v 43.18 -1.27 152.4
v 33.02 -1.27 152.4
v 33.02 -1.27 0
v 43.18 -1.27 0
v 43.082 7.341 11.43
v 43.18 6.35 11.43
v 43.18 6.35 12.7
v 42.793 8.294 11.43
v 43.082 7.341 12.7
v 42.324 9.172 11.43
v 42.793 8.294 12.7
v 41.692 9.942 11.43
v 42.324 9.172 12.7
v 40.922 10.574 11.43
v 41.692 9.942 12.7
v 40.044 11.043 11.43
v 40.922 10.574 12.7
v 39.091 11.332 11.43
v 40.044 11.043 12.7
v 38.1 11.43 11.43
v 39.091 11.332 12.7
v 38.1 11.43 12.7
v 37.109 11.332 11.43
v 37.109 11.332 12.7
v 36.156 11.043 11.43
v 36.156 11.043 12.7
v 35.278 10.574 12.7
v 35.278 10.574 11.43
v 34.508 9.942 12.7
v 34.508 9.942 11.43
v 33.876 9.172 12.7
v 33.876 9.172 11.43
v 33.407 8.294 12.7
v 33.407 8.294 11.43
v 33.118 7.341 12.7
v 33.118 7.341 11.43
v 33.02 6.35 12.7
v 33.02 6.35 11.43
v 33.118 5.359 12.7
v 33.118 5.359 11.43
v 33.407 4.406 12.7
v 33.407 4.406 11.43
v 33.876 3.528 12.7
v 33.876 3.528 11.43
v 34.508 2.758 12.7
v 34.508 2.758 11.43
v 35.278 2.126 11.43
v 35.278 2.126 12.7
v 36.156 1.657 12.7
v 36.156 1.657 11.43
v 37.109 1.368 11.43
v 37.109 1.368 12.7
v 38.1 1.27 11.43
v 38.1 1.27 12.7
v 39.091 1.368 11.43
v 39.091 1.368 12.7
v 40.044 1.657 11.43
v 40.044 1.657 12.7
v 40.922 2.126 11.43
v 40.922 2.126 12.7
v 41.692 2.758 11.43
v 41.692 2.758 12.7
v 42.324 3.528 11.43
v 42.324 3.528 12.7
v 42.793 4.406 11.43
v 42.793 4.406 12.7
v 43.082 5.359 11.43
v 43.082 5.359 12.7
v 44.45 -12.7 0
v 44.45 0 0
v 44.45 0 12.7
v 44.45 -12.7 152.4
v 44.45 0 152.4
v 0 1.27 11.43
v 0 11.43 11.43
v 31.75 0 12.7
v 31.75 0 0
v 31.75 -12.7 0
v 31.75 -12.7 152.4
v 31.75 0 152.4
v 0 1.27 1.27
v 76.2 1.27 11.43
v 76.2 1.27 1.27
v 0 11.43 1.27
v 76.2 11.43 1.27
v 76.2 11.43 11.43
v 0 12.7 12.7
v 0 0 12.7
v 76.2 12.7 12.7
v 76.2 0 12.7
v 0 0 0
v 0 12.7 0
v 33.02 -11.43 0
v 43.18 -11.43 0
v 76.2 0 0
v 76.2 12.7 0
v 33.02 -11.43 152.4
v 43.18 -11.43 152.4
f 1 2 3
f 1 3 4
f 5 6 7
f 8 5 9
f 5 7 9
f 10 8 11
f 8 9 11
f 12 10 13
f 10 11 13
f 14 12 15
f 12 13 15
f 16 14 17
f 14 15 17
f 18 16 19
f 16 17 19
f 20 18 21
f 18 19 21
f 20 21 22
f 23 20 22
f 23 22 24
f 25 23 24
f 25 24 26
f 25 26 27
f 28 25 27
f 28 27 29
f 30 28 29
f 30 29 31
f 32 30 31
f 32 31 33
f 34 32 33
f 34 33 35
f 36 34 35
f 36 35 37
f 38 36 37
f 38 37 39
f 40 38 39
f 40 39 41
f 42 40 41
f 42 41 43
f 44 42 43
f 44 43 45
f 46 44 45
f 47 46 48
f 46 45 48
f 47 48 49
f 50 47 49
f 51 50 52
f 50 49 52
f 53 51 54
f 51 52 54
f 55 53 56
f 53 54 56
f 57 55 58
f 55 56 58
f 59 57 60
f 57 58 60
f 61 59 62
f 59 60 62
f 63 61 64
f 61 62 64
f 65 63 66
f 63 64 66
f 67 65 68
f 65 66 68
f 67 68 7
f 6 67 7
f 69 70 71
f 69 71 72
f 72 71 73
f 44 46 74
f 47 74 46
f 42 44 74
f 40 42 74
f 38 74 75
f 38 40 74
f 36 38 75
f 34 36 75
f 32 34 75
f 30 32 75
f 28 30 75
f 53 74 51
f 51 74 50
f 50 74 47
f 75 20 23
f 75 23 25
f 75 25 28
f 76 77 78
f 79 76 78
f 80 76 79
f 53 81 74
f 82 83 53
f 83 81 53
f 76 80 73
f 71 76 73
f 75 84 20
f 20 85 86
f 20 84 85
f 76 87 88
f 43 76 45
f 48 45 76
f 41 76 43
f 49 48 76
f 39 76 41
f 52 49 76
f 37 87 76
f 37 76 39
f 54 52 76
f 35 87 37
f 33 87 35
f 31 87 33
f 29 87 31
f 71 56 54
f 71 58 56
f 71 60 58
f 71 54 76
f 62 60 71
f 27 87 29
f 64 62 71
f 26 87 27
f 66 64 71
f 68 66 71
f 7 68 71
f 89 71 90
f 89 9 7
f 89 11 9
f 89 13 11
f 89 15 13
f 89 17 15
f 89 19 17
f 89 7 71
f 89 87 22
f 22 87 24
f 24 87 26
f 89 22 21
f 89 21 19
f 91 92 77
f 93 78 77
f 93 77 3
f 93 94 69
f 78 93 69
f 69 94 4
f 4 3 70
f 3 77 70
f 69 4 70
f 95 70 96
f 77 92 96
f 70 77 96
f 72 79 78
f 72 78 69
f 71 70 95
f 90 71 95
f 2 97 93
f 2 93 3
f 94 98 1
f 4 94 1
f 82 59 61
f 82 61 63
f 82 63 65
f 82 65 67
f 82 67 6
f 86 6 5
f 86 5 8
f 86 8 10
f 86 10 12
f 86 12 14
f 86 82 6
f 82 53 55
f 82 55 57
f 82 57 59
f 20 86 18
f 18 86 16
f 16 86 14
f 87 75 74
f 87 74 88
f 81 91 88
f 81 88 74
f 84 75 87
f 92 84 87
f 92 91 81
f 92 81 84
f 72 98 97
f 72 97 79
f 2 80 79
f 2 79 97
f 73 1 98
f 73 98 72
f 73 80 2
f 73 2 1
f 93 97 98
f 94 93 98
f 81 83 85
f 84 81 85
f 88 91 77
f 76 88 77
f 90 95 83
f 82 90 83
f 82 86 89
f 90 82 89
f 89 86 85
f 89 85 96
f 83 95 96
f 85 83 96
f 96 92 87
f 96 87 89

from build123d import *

# Parameters (mm, degrees)
F0_W     = 76.2
F0_H     = 12.7
F1_DEPTH = 12.7
F2_W     = 10.16
F2_H     = 10.16
F3_DEPTH = 76.201
F4_R     = 5.08
F5_DEPTH = 1.27
F6_W     = 12.7
F6_H     = 152.4
F7_DEPTH = 12.7
F8_W     = 10.16
F8_H     = 10.16
F9_DEPTH = 152.401


with BuildPart() as f1:
    # F0 (on Top) → F1 (new body)
    with BuildSketch(Plane.XY):
        with Locations((38.1, 6.35)):
            Rectangle(F0_W, F0_H)
    extrude(amount=F1_DEPTH)

    # F2 (on face) → F3 (cut, through all)
    with BuildSketch(Plane.YZ.offset(76.2)):
        with Locations((6.35, 6.35)):
            Rectangle(F2_W, F2_H)
    extrude(amount=-F3_DEPTH, mode=Mode.SUBTRACT)

    # F4 (on face) → F5 (cut, through all)
    with BuildSketch(Plane.XY.offset(12.7)):
        with Locations((38.1, 6.35)):
            Circle(F4_R)
    extrude(amount=-F5_DEPTH, mode=Mode.SUBTRACT)

    # F6 (on face) → F7 (join)
    with BuildSketch(Plane.XZ):
        with Locations((38.1, 76.2)):
            Rectangle(F6_W, F6_H)
    extrude(amount=F7_DEPTH)

    # F8 (on face) → F9 (cut, through all)
    with BuildSketch(Plane.XY.offset(152.4)):
        with Locations((38.1, -6.35)):
            Rectangle(F8_W, F8_H)
    extrude(amount=-F9_DEPTH, mode=Mode.SUBTRACT)


solid = f1.part
